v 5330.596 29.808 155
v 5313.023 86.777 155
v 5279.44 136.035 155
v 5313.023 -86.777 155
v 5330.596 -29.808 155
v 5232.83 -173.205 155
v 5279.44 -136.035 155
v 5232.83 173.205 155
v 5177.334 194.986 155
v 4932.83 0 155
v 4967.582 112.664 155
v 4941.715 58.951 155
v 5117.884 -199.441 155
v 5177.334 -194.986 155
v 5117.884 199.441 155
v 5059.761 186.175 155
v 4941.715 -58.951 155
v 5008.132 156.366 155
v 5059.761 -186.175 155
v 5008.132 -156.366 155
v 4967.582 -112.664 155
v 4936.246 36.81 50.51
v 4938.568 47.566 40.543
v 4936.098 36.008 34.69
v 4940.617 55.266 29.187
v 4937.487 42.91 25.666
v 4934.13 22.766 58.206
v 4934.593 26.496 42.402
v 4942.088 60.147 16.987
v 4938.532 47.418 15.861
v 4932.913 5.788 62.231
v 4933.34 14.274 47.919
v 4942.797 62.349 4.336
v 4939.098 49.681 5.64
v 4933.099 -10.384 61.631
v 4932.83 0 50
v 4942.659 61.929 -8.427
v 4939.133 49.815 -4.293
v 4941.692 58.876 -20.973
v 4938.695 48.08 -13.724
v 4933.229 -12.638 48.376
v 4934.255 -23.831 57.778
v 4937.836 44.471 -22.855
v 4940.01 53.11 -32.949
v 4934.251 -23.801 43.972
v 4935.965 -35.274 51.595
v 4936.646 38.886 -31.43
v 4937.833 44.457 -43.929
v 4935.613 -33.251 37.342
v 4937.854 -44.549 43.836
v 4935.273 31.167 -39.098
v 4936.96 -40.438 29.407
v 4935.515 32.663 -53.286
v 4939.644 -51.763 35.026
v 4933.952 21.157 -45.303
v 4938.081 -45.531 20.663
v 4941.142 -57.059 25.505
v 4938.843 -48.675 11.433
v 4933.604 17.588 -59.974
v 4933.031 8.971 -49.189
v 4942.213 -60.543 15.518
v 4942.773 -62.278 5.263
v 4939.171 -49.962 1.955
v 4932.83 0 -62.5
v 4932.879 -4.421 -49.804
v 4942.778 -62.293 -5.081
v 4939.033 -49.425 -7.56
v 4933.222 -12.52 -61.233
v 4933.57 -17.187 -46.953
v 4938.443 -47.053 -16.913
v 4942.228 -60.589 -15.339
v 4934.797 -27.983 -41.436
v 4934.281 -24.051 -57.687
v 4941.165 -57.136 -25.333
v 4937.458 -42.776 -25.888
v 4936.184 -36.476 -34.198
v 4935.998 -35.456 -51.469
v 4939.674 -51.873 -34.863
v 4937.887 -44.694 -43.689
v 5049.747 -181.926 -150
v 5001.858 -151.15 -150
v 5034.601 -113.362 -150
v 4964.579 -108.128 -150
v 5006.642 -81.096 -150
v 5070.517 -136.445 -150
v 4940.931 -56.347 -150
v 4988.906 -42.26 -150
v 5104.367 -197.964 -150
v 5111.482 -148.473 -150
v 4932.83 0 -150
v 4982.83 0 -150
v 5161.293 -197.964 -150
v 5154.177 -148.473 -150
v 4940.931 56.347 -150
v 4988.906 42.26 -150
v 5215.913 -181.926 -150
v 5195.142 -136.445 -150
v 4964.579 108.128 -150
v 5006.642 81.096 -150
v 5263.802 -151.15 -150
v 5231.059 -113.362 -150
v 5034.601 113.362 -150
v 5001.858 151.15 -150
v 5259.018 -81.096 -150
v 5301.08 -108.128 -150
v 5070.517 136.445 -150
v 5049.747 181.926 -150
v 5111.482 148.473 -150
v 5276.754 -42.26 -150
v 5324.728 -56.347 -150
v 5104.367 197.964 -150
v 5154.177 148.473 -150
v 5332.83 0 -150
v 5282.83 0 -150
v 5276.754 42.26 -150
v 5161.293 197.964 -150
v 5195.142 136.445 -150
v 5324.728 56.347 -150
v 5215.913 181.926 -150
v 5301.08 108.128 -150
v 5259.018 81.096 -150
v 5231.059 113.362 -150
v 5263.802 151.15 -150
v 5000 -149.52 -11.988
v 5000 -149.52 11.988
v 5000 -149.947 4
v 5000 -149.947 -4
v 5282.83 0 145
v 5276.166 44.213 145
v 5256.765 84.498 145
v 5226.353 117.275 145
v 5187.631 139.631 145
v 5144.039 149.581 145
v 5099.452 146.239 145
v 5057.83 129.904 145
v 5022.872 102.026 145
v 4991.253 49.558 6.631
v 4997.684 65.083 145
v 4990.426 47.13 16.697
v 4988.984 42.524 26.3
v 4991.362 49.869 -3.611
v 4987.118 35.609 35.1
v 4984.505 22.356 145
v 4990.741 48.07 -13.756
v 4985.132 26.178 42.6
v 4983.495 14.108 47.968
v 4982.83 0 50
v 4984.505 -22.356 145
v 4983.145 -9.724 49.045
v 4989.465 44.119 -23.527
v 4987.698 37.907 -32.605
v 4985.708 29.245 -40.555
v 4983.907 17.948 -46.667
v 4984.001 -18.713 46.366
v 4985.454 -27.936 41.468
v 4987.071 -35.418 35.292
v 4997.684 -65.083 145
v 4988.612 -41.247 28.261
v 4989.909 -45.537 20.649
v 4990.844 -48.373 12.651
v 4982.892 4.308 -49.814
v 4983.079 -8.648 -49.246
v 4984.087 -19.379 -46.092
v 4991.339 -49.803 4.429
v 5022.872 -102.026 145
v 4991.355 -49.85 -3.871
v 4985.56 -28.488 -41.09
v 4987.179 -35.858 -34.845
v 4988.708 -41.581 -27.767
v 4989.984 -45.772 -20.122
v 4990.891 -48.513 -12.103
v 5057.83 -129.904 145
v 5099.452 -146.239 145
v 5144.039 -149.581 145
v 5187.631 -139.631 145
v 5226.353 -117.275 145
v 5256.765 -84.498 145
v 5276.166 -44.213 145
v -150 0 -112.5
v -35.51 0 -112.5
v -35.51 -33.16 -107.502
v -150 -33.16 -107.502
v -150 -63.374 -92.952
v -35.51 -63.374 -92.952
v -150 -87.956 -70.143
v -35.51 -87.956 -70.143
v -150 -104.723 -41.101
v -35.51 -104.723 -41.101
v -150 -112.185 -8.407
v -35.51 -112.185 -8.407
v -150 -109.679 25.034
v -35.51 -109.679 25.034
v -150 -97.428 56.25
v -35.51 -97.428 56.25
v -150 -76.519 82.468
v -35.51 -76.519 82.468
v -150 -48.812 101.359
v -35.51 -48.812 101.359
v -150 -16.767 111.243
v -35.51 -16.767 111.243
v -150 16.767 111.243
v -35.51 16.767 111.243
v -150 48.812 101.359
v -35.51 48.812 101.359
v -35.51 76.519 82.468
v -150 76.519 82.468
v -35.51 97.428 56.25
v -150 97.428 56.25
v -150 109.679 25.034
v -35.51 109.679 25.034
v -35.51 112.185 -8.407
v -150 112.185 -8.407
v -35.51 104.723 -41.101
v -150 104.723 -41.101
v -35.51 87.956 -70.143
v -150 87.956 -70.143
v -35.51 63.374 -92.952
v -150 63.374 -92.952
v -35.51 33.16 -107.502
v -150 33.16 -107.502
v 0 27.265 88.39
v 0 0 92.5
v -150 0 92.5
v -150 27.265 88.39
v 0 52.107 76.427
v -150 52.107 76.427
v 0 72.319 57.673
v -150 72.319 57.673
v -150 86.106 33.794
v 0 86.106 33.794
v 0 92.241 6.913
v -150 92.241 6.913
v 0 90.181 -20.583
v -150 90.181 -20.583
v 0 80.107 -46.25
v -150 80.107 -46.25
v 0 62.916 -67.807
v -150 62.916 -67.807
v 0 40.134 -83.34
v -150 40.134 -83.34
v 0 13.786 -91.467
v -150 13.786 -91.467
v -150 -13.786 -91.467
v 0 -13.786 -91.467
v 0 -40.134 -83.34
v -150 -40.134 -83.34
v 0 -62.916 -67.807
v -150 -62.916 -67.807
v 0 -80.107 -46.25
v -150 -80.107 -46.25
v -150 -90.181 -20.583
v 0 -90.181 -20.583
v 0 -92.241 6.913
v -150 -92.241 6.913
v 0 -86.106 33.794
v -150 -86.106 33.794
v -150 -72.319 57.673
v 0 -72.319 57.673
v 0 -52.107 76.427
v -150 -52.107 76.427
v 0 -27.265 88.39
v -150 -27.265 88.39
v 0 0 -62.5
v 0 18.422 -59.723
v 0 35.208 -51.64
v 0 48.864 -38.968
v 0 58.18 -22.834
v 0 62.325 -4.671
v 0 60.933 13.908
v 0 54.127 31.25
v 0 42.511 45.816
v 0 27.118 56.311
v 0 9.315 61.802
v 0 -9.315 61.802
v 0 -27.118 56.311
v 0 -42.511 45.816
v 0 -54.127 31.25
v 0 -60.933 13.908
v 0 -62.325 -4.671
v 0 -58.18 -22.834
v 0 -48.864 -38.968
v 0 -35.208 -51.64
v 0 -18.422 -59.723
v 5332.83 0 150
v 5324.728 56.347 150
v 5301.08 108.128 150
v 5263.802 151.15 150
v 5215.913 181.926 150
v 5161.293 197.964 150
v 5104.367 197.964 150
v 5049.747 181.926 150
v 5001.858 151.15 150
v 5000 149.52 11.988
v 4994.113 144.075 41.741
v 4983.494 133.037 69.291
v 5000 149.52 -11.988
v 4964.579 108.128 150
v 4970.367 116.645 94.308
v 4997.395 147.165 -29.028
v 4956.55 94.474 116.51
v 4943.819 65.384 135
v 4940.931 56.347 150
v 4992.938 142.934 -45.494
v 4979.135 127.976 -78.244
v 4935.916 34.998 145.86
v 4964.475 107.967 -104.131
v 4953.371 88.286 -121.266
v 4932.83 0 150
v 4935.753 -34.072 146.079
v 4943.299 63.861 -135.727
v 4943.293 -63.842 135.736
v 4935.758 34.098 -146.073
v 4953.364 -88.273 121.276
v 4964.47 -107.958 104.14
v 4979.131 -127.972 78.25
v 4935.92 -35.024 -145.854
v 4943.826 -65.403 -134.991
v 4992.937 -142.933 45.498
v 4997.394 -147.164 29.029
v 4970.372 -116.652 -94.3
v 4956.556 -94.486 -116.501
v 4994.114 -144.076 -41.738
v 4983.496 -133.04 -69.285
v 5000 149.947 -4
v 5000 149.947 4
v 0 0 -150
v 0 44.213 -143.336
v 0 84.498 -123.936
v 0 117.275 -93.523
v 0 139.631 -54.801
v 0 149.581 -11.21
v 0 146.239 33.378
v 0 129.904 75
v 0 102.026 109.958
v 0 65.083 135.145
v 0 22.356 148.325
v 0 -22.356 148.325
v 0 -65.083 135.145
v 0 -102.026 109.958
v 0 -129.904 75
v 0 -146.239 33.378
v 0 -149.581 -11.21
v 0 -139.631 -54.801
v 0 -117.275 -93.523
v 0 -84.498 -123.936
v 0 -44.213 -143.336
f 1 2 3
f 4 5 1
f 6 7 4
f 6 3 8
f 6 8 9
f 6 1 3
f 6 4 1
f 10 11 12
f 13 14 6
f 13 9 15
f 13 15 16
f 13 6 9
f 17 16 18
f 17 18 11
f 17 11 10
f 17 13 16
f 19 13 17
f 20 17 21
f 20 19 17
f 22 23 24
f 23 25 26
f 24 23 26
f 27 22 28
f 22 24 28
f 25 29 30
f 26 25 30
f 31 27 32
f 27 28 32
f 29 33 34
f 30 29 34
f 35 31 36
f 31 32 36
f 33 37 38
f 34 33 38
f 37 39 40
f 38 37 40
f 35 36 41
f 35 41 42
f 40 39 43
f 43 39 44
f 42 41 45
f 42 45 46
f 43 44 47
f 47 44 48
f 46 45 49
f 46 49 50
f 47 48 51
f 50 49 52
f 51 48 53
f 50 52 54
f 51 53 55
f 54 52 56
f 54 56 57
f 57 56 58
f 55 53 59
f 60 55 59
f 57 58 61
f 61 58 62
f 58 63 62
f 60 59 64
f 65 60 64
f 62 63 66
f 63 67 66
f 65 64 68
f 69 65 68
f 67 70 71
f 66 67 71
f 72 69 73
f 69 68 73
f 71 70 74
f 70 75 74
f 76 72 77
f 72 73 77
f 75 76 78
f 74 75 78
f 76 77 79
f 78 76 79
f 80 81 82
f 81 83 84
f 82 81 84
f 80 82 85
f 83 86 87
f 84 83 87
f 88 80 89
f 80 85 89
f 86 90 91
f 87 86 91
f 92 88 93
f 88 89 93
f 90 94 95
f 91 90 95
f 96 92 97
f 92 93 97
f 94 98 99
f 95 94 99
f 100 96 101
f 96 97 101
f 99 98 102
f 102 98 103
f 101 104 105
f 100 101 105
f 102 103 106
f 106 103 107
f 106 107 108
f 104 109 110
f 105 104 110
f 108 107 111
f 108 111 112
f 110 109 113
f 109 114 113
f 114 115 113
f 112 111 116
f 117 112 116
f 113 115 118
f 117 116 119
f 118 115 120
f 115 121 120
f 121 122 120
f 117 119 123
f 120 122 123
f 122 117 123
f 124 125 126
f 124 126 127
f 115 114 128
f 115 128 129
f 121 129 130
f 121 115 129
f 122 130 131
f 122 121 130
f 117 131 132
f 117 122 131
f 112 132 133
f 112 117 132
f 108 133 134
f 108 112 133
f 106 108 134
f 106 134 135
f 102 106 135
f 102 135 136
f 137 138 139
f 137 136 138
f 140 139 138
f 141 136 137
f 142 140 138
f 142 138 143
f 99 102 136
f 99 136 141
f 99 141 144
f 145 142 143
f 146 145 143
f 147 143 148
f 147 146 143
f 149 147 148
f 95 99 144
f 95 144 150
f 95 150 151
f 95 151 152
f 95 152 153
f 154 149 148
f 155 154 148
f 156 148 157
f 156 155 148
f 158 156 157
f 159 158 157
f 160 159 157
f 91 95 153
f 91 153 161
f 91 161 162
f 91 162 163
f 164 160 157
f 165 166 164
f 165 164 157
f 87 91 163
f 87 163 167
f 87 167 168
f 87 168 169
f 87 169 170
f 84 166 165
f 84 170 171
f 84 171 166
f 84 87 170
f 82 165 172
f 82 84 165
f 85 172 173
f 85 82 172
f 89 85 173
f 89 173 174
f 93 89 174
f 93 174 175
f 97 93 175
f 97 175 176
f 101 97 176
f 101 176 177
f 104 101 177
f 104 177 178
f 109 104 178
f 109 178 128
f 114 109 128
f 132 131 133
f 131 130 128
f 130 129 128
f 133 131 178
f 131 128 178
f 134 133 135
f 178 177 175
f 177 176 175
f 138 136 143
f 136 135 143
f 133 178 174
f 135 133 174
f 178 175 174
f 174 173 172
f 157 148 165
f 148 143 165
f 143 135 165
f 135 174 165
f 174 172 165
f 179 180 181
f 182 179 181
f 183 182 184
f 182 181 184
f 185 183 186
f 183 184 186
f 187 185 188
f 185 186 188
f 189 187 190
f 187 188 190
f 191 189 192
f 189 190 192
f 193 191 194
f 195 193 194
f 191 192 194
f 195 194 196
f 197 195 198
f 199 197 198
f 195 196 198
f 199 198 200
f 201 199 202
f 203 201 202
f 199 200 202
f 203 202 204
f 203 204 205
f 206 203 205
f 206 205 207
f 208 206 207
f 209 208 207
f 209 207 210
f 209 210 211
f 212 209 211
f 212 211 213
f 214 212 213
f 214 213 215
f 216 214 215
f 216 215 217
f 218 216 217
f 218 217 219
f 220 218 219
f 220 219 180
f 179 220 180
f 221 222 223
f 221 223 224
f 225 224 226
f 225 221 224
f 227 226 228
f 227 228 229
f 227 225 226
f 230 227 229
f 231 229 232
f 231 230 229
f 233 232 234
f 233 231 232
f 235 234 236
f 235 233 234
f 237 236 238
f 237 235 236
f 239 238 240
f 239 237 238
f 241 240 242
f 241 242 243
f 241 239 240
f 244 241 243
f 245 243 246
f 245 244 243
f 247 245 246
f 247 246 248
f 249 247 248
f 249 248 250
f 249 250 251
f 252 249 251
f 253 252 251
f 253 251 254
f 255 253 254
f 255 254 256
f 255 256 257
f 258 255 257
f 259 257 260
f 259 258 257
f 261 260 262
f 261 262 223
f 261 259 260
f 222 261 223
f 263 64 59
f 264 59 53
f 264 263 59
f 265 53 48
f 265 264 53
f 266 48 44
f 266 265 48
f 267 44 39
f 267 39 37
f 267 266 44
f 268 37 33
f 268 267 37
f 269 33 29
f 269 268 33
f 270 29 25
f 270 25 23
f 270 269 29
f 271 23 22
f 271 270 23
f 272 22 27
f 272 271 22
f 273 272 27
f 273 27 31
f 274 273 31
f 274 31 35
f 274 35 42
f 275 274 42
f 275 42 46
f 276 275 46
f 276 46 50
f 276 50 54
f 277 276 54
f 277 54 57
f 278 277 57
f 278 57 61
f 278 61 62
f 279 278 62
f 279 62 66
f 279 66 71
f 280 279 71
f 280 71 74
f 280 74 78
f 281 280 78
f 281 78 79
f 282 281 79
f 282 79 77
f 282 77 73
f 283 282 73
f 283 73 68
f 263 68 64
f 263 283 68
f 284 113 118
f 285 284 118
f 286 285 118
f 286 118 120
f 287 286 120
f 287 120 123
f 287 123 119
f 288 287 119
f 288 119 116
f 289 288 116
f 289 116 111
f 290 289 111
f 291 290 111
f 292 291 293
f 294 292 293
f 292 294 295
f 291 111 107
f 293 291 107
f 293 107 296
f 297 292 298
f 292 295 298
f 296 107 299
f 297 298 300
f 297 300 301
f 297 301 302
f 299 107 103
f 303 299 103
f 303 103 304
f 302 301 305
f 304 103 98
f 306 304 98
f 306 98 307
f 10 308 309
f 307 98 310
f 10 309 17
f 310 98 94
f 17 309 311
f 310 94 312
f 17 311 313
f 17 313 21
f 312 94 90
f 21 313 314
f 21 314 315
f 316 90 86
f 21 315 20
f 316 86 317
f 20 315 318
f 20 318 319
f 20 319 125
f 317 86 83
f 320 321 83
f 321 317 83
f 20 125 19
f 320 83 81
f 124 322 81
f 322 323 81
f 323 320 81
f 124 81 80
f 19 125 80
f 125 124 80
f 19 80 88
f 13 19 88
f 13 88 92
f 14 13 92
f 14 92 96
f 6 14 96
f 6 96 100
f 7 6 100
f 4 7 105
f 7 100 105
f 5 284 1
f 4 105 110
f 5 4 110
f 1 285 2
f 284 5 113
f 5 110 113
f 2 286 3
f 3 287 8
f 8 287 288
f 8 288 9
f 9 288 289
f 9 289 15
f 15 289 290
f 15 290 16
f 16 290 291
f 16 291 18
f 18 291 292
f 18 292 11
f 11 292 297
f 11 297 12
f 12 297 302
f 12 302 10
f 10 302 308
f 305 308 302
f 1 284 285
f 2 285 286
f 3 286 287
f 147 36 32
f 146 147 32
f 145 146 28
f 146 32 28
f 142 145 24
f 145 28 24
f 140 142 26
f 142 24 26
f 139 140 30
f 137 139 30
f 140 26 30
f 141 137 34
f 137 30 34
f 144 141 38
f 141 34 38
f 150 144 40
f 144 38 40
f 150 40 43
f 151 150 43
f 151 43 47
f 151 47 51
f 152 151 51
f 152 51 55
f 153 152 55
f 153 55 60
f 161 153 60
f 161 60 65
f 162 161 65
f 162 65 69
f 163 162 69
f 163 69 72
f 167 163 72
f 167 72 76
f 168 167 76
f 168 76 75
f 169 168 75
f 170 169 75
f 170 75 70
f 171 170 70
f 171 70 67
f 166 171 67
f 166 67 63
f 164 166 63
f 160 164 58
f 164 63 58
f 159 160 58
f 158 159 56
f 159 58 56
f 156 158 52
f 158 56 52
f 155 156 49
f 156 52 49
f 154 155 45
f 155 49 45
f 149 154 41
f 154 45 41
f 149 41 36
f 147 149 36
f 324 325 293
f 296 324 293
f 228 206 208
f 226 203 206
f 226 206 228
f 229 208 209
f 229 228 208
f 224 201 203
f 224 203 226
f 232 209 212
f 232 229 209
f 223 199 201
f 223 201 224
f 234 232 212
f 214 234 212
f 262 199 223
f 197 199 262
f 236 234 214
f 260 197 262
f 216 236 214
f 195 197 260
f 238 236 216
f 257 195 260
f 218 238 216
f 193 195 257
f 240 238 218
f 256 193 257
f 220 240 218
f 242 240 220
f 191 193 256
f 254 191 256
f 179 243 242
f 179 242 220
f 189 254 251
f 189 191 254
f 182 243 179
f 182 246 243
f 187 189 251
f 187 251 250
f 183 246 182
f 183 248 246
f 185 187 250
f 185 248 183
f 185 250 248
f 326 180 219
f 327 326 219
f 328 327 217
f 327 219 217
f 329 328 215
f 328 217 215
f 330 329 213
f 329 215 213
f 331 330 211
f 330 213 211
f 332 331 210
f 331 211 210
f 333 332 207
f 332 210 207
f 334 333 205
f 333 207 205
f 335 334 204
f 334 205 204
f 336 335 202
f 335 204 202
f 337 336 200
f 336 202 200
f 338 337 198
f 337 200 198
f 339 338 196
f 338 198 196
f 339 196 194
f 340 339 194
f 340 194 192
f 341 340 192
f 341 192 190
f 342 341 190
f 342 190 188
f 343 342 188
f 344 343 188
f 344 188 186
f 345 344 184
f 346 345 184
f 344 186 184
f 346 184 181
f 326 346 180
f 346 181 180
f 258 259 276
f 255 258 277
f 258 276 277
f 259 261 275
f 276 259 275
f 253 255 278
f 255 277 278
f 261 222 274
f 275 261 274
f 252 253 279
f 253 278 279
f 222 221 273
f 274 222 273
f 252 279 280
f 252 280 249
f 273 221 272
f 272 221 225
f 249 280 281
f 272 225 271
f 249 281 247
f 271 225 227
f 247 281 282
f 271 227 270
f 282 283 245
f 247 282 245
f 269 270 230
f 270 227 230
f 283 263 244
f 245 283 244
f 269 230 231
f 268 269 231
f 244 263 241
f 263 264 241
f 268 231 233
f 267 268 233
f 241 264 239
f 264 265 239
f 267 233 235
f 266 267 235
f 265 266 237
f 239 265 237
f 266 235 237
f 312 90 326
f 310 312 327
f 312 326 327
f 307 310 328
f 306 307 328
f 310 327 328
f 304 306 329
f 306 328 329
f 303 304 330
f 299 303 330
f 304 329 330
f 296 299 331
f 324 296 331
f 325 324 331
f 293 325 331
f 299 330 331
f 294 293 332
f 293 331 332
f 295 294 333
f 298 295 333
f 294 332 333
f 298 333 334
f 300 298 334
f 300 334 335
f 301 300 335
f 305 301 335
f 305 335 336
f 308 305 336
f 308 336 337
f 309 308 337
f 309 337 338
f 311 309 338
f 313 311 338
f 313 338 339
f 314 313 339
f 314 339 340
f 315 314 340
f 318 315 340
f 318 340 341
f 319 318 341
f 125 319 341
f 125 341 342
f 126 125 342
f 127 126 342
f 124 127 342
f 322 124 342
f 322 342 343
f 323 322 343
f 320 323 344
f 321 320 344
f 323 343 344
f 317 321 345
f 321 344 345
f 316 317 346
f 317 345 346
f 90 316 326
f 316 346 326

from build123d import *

# Parameters (mm, degrees)
SKETCH2_R                 = 150
SKETCH2_R_2               = 62.5
BOSS_EXTRUDE1_DEPTH       = 5000
SKETCH3_R                 = 112.5
SKETCH3_R_2               = 92.5
BOSS_EXTRUDE2_DEPTH       = 150
BOSS_EXTRUDE9_START       = -150
SKETCH4_R                 = 200
SKETCH4_R_2               = 150
BOSS_EXTRUDE9_DEPTH       = 300
SKETCH5_R                 = 150
CUT_EXTRUDE1_DEPTH        = 175
SKETCH6_R                 = 50
CUT_EXTRUDE2_DEPTH        = 5024
BOSS_EXTRUDE10_DEPTH      = 5
BOSS_EXTRUDE10_DEPTH_BACK = 5
SKETCH9_R                 = 200
SKETCH10_R                = 150
CUT_EXTRUDE3_DEPTH        = 202


with BuildPart() as part:
    # Sketch2 → Boss-Extrude1 (new body)
    with BuildSketch(Plane(origin=(0, 0, 0), x_dir=(0, 0, -1), z_dir=(1, 0, 0))):
        Circle(SKETCH2_R)
        Circle(SKETCH2_R_2, mode=Mode.SUBTRACT)
    extrude(amount=BOSS_EXTRUDE1_DEPTH)

    # Sketch3 → Boss-Extrude2 (add)
    with BuildSketch(Plane.ZY):
        with Locations(Location((0, 0, 0), (0, 0, 180))):
            Circle(SKETCH3_R)
        Circle(SKETCH3_R_2, mode=Mode.SUBTRACT)
    extrude(amount=BOSS_EXTRUDE2_DEPTH)

    # Sketch5 → Cut-Extrude1 (cut)
    with BuildSketch(Plane.XY.offset(150)):
        with Locations((5132.829656673, 0)):
            Circle(SKETCH5_R)
    extrude(amount=-CUT_EXTRUDE1_DEPTH, mode=Mode.SUBTRACT)

    # Sketch7 → Revolve1 (revolve)
    with BuildSketch(Plane.XY, mode=Mode.PRIVATE) as revolve1_sk:
        Polygon((0, 112.5), (0, 150), (-35.510152968, 112.5), align=None)
    revolve(revolve1_sk.sketch.rotate(Axis((-224.79445864, 0, 0), (1, 0, 0)), 270), axis=Axis((-224.79445864, 0, 0), (1, 0, 0)))



with BuildPart() as body_2:
    # Sketch4 → Boss-Extrude9 (new body)
    with BuildSketch(Plane.XY.offset(BOSS_EXTRUDE9_START)):
        with Locations((5132.829656673, 0)):
            Circle(SKETCH4_R)
        with Locations((5132.829656673, 0)):
            Circle(SKETCH4_R_2, mode=Mode.SUBTRACT)
    extrude(amount=BOSS_EXTRUDE9_DEPTH)

    # Sketch6 → Cut-Extrude2 (cut)
    with BuildSketch(Plane.ZY):
        Circle(SKETCH6_R)
    extrude(amount=-CUT_EXTRUDE2_DEPTH, mode=Mode.SUBTRACT)


with BuildPart() as part_1:
    add(part.part)

    add(body_2.part)  # Boss-Extrude10 merges body 2
    # Sketch9 → Boss-Extrude10 (add, two sides: drawn at the far end of the back side and taken through both)
    with BuildSketch(Plane.XY.offset(150).offset(-BOSS_EXTRUDE10_DEPTH_BACK)):
        with Locations(Location((5132.829656673, 0, 0), (0, 0, 180))):
            Circle(SKETCH9_R)
    extrude(amount=BOSS_EXTRUDE10_DEPTH + BOSS_EXTRUDE10_DEPTH_BACK)

    # Sketch10 → Cut-Extrude3 (cut)
    with BuildSketch(Plane(origin=(0, 0, -150), x_dir=(-1, 0, 0), z_dir=(0, 0, -1))):
        with Locations(Location((-5132.829656673, 0, 0), (0, 0, 180))):
            Circle(SKETCH10_R)
    extrude(amount=-CUT_EXTRUDE3_DEPTH, mode=Mode.SUBTRACT)


solid = part_1.part
